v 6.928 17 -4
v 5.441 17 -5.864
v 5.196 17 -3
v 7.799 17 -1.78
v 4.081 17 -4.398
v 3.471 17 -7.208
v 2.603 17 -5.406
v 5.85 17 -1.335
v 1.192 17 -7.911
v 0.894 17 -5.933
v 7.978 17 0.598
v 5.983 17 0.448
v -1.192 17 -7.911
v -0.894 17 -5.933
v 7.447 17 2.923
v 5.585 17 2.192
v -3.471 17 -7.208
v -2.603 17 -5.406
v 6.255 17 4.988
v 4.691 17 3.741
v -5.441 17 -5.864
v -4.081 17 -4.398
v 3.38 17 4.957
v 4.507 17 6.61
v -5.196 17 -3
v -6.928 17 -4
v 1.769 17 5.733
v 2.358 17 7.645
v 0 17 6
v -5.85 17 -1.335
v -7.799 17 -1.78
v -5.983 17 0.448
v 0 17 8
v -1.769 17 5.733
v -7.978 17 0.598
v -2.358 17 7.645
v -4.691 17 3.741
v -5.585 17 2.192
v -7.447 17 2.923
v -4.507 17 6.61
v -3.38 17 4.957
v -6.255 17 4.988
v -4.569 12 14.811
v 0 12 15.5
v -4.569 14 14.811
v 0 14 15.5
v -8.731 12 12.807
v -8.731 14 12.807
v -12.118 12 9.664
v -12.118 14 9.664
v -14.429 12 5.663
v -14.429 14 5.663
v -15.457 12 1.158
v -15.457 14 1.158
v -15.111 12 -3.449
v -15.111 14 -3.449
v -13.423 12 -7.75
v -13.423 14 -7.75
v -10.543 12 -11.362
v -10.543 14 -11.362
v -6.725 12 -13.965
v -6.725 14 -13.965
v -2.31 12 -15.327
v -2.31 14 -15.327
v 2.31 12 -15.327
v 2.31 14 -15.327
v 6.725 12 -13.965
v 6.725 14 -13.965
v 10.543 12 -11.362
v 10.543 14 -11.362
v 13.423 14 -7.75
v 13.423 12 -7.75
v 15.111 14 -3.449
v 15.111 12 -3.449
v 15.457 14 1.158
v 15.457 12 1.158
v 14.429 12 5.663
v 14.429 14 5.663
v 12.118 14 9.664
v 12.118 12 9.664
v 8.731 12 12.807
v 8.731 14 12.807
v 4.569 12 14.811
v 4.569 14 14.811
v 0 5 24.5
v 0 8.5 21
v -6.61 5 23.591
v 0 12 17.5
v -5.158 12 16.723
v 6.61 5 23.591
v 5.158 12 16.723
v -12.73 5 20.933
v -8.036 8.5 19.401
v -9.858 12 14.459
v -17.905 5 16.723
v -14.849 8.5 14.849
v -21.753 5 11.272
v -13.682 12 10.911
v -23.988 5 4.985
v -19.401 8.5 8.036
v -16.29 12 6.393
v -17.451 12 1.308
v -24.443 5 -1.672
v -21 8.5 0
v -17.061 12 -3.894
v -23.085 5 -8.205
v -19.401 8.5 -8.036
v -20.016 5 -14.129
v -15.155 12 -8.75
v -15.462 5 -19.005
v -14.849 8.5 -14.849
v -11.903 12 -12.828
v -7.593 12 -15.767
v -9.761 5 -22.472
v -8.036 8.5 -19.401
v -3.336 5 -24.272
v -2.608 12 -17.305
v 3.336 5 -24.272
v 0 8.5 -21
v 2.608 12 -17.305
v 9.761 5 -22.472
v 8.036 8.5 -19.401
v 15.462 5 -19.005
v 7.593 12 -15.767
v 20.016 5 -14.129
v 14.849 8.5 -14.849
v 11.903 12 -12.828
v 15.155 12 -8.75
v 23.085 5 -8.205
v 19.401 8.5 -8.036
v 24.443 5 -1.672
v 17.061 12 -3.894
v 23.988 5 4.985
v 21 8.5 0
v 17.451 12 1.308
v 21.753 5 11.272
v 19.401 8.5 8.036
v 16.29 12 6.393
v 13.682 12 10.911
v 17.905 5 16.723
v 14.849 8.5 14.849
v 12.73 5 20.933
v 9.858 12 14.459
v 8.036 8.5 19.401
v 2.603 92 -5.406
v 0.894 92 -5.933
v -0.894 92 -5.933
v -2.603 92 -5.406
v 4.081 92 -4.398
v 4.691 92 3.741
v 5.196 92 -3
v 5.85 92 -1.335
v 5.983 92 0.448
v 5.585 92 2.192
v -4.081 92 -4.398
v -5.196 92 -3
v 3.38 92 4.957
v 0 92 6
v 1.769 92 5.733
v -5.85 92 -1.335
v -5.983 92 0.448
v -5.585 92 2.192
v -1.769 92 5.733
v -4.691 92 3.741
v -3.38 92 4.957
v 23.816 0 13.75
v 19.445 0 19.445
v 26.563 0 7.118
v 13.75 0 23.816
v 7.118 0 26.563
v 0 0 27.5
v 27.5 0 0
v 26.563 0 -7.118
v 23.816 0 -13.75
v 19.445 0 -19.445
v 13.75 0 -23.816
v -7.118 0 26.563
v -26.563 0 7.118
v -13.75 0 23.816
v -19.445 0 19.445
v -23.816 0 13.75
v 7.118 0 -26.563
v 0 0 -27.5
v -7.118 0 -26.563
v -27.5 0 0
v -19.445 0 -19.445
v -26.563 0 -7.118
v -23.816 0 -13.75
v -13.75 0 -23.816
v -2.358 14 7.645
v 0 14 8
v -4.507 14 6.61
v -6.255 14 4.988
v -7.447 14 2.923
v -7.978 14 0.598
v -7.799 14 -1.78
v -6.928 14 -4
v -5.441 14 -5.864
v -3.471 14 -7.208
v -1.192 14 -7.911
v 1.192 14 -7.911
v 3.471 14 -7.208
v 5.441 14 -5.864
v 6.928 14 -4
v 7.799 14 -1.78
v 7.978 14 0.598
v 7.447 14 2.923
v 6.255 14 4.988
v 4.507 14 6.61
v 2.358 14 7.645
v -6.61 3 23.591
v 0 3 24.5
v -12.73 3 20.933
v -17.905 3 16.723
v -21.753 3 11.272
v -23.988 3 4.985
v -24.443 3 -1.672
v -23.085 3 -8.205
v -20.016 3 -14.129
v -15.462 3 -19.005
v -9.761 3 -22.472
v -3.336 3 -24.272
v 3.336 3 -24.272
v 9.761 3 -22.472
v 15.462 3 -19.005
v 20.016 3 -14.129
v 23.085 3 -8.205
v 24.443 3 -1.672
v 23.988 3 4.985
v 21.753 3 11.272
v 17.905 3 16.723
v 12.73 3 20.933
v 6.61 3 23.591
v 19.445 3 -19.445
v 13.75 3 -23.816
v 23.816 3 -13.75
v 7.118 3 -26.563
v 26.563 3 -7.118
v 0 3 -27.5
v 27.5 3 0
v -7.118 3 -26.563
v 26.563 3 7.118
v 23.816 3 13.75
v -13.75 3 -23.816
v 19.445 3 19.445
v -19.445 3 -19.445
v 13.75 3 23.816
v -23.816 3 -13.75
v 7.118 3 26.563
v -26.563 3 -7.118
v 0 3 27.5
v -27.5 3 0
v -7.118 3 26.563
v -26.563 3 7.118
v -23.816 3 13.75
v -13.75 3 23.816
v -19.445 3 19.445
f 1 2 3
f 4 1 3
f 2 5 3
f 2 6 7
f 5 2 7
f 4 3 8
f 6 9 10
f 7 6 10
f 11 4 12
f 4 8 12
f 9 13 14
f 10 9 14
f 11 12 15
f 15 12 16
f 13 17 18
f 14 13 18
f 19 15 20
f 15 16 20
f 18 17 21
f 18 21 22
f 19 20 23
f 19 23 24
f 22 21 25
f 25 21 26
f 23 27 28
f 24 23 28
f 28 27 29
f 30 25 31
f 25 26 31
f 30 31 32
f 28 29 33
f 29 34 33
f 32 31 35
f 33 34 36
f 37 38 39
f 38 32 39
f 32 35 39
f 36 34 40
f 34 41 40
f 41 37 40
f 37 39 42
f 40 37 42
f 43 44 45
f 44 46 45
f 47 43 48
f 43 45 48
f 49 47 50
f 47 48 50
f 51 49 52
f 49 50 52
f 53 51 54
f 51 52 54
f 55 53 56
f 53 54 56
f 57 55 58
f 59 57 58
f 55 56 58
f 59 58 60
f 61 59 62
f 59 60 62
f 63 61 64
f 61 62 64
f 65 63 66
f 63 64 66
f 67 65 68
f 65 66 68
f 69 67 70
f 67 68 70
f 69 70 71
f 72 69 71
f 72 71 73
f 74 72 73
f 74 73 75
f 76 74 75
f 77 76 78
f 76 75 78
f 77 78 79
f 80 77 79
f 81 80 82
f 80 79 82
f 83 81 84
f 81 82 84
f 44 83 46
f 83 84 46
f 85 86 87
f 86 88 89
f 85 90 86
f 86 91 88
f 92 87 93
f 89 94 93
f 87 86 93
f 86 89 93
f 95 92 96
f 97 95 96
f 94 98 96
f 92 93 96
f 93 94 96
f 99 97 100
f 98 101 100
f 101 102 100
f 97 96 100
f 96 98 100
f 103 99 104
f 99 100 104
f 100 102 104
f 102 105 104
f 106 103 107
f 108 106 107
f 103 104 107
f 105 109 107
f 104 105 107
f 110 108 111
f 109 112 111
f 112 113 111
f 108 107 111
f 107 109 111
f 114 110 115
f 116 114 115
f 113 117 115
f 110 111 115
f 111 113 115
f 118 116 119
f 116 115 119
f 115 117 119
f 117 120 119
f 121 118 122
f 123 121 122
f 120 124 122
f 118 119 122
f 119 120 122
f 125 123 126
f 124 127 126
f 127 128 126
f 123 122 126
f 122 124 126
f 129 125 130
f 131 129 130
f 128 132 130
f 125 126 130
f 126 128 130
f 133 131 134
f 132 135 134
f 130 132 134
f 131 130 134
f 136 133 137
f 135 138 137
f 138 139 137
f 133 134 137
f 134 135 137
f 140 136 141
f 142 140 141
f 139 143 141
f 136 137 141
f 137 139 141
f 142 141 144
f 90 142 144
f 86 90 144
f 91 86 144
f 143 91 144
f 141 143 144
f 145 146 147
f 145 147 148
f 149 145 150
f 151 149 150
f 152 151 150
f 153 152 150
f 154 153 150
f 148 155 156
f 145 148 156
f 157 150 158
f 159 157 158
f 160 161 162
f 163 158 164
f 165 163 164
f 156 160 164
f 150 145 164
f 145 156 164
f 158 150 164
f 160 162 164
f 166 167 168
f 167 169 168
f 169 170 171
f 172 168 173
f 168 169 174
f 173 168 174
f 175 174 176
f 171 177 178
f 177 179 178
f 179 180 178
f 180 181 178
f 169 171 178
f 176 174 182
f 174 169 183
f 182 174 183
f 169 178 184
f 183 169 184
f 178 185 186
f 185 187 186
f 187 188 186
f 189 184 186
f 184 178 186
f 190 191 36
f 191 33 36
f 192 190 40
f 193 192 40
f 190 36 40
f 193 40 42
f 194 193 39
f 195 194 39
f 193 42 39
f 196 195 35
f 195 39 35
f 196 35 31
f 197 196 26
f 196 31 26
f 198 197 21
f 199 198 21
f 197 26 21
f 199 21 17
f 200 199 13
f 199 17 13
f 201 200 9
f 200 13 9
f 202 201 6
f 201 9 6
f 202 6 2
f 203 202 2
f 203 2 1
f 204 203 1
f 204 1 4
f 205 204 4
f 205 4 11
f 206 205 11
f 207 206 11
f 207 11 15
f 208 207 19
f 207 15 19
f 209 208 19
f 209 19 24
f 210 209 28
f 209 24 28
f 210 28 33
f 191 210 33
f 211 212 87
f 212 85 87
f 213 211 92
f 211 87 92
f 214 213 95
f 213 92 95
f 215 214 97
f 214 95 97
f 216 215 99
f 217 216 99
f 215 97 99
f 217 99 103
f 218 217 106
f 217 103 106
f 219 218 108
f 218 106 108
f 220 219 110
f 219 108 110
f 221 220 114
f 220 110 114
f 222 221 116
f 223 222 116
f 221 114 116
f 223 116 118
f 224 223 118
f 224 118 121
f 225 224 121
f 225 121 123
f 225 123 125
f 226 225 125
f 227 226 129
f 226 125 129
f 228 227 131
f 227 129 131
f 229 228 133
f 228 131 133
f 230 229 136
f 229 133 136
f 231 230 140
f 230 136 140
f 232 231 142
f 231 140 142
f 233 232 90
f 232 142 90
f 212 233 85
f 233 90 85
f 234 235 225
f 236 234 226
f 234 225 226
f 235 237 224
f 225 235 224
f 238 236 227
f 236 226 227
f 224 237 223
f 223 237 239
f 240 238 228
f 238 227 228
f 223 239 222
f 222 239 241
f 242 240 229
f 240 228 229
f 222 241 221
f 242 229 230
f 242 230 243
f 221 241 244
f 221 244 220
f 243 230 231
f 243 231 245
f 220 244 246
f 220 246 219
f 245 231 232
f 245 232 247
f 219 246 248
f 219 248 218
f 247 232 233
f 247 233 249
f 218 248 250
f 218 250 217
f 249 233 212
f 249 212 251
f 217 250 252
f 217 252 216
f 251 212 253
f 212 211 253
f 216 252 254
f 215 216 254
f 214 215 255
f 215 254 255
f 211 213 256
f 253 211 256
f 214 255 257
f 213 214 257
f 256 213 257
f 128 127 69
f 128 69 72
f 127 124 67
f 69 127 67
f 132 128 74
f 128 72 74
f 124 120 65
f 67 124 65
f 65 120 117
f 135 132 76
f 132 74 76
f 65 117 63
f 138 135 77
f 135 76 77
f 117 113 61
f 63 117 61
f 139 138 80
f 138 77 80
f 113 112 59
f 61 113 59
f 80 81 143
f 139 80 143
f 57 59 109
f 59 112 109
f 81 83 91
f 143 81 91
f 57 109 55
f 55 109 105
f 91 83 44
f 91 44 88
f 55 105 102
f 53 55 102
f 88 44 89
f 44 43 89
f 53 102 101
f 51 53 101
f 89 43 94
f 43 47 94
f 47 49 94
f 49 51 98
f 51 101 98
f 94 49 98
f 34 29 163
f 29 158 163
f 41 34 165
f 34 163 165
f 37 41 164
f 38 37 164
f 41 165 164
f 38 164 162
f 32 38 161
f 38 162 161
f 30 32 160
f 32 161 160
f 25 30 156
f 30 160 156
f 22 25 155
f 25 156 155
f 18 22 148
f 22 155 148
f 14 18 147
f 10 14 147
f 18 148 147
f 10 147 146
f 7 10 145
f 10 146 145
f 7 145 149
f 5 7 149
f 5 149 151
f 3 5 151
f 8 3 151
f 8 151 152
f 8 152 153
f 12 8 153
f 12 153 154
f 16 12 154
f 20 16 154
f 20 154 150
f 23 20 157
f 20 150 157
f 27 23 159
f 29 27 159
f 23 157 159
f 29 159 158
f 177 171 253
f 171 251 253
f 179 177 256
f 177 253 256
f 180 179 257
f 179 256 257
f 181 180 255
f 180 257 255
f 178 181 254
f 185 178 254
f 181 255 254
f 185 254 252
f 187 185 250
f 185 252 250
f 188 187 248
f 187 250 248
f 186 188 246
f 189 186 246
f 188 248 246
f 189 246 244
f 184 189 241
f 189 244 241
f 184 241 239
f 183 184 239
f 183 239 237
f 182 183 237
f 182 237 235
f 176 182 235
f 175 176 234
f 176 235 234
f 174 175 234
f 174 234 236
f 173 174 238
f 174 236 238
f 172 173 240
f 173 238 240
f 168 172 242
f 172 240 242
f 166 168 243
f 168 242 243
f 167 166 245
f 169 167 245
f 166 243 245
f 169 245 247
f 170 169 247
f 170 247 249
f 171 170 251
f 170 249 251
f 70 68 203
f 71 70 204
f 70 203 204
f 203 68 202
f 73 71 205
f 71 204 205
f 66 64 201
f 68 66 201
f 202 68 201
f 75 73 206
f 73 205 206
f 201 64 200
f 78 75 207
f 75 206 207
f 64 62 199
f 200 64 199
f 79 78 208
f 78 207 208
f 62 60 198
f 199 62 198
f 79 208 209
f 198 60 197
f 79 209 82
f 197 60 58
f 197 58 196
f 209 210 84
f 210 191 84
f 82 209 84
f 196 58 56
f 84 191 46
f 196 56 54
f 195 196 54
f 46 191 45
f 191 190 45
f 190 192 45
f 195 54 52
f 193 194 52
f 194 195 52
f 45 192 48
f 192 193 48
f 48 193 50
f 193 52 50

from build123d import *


with BuildPart() as part:
    # Esquisse1 → Révolution1 (revolve)
    with BuildSketch(Plane.XY, mode=Mode.PRIVATE) as r_volution1_sk:
        Polygon((0, 0), (27.5, 0), (27.5, 3), (24.5, 3), (24.5, 5), (17.5, 12), (15.5, 12), (15.5, 14), (8, 14), (8, 17), (6, 17), (6, 92), (0, 92), align=None)
    revolve(r_volution1_sk.sketch.rotate(Axis((0, 92, 0), (0, -1, 0)), 90), axis=Axis((0, 92, 0), (0, -1, 0)))


solid = part.part
